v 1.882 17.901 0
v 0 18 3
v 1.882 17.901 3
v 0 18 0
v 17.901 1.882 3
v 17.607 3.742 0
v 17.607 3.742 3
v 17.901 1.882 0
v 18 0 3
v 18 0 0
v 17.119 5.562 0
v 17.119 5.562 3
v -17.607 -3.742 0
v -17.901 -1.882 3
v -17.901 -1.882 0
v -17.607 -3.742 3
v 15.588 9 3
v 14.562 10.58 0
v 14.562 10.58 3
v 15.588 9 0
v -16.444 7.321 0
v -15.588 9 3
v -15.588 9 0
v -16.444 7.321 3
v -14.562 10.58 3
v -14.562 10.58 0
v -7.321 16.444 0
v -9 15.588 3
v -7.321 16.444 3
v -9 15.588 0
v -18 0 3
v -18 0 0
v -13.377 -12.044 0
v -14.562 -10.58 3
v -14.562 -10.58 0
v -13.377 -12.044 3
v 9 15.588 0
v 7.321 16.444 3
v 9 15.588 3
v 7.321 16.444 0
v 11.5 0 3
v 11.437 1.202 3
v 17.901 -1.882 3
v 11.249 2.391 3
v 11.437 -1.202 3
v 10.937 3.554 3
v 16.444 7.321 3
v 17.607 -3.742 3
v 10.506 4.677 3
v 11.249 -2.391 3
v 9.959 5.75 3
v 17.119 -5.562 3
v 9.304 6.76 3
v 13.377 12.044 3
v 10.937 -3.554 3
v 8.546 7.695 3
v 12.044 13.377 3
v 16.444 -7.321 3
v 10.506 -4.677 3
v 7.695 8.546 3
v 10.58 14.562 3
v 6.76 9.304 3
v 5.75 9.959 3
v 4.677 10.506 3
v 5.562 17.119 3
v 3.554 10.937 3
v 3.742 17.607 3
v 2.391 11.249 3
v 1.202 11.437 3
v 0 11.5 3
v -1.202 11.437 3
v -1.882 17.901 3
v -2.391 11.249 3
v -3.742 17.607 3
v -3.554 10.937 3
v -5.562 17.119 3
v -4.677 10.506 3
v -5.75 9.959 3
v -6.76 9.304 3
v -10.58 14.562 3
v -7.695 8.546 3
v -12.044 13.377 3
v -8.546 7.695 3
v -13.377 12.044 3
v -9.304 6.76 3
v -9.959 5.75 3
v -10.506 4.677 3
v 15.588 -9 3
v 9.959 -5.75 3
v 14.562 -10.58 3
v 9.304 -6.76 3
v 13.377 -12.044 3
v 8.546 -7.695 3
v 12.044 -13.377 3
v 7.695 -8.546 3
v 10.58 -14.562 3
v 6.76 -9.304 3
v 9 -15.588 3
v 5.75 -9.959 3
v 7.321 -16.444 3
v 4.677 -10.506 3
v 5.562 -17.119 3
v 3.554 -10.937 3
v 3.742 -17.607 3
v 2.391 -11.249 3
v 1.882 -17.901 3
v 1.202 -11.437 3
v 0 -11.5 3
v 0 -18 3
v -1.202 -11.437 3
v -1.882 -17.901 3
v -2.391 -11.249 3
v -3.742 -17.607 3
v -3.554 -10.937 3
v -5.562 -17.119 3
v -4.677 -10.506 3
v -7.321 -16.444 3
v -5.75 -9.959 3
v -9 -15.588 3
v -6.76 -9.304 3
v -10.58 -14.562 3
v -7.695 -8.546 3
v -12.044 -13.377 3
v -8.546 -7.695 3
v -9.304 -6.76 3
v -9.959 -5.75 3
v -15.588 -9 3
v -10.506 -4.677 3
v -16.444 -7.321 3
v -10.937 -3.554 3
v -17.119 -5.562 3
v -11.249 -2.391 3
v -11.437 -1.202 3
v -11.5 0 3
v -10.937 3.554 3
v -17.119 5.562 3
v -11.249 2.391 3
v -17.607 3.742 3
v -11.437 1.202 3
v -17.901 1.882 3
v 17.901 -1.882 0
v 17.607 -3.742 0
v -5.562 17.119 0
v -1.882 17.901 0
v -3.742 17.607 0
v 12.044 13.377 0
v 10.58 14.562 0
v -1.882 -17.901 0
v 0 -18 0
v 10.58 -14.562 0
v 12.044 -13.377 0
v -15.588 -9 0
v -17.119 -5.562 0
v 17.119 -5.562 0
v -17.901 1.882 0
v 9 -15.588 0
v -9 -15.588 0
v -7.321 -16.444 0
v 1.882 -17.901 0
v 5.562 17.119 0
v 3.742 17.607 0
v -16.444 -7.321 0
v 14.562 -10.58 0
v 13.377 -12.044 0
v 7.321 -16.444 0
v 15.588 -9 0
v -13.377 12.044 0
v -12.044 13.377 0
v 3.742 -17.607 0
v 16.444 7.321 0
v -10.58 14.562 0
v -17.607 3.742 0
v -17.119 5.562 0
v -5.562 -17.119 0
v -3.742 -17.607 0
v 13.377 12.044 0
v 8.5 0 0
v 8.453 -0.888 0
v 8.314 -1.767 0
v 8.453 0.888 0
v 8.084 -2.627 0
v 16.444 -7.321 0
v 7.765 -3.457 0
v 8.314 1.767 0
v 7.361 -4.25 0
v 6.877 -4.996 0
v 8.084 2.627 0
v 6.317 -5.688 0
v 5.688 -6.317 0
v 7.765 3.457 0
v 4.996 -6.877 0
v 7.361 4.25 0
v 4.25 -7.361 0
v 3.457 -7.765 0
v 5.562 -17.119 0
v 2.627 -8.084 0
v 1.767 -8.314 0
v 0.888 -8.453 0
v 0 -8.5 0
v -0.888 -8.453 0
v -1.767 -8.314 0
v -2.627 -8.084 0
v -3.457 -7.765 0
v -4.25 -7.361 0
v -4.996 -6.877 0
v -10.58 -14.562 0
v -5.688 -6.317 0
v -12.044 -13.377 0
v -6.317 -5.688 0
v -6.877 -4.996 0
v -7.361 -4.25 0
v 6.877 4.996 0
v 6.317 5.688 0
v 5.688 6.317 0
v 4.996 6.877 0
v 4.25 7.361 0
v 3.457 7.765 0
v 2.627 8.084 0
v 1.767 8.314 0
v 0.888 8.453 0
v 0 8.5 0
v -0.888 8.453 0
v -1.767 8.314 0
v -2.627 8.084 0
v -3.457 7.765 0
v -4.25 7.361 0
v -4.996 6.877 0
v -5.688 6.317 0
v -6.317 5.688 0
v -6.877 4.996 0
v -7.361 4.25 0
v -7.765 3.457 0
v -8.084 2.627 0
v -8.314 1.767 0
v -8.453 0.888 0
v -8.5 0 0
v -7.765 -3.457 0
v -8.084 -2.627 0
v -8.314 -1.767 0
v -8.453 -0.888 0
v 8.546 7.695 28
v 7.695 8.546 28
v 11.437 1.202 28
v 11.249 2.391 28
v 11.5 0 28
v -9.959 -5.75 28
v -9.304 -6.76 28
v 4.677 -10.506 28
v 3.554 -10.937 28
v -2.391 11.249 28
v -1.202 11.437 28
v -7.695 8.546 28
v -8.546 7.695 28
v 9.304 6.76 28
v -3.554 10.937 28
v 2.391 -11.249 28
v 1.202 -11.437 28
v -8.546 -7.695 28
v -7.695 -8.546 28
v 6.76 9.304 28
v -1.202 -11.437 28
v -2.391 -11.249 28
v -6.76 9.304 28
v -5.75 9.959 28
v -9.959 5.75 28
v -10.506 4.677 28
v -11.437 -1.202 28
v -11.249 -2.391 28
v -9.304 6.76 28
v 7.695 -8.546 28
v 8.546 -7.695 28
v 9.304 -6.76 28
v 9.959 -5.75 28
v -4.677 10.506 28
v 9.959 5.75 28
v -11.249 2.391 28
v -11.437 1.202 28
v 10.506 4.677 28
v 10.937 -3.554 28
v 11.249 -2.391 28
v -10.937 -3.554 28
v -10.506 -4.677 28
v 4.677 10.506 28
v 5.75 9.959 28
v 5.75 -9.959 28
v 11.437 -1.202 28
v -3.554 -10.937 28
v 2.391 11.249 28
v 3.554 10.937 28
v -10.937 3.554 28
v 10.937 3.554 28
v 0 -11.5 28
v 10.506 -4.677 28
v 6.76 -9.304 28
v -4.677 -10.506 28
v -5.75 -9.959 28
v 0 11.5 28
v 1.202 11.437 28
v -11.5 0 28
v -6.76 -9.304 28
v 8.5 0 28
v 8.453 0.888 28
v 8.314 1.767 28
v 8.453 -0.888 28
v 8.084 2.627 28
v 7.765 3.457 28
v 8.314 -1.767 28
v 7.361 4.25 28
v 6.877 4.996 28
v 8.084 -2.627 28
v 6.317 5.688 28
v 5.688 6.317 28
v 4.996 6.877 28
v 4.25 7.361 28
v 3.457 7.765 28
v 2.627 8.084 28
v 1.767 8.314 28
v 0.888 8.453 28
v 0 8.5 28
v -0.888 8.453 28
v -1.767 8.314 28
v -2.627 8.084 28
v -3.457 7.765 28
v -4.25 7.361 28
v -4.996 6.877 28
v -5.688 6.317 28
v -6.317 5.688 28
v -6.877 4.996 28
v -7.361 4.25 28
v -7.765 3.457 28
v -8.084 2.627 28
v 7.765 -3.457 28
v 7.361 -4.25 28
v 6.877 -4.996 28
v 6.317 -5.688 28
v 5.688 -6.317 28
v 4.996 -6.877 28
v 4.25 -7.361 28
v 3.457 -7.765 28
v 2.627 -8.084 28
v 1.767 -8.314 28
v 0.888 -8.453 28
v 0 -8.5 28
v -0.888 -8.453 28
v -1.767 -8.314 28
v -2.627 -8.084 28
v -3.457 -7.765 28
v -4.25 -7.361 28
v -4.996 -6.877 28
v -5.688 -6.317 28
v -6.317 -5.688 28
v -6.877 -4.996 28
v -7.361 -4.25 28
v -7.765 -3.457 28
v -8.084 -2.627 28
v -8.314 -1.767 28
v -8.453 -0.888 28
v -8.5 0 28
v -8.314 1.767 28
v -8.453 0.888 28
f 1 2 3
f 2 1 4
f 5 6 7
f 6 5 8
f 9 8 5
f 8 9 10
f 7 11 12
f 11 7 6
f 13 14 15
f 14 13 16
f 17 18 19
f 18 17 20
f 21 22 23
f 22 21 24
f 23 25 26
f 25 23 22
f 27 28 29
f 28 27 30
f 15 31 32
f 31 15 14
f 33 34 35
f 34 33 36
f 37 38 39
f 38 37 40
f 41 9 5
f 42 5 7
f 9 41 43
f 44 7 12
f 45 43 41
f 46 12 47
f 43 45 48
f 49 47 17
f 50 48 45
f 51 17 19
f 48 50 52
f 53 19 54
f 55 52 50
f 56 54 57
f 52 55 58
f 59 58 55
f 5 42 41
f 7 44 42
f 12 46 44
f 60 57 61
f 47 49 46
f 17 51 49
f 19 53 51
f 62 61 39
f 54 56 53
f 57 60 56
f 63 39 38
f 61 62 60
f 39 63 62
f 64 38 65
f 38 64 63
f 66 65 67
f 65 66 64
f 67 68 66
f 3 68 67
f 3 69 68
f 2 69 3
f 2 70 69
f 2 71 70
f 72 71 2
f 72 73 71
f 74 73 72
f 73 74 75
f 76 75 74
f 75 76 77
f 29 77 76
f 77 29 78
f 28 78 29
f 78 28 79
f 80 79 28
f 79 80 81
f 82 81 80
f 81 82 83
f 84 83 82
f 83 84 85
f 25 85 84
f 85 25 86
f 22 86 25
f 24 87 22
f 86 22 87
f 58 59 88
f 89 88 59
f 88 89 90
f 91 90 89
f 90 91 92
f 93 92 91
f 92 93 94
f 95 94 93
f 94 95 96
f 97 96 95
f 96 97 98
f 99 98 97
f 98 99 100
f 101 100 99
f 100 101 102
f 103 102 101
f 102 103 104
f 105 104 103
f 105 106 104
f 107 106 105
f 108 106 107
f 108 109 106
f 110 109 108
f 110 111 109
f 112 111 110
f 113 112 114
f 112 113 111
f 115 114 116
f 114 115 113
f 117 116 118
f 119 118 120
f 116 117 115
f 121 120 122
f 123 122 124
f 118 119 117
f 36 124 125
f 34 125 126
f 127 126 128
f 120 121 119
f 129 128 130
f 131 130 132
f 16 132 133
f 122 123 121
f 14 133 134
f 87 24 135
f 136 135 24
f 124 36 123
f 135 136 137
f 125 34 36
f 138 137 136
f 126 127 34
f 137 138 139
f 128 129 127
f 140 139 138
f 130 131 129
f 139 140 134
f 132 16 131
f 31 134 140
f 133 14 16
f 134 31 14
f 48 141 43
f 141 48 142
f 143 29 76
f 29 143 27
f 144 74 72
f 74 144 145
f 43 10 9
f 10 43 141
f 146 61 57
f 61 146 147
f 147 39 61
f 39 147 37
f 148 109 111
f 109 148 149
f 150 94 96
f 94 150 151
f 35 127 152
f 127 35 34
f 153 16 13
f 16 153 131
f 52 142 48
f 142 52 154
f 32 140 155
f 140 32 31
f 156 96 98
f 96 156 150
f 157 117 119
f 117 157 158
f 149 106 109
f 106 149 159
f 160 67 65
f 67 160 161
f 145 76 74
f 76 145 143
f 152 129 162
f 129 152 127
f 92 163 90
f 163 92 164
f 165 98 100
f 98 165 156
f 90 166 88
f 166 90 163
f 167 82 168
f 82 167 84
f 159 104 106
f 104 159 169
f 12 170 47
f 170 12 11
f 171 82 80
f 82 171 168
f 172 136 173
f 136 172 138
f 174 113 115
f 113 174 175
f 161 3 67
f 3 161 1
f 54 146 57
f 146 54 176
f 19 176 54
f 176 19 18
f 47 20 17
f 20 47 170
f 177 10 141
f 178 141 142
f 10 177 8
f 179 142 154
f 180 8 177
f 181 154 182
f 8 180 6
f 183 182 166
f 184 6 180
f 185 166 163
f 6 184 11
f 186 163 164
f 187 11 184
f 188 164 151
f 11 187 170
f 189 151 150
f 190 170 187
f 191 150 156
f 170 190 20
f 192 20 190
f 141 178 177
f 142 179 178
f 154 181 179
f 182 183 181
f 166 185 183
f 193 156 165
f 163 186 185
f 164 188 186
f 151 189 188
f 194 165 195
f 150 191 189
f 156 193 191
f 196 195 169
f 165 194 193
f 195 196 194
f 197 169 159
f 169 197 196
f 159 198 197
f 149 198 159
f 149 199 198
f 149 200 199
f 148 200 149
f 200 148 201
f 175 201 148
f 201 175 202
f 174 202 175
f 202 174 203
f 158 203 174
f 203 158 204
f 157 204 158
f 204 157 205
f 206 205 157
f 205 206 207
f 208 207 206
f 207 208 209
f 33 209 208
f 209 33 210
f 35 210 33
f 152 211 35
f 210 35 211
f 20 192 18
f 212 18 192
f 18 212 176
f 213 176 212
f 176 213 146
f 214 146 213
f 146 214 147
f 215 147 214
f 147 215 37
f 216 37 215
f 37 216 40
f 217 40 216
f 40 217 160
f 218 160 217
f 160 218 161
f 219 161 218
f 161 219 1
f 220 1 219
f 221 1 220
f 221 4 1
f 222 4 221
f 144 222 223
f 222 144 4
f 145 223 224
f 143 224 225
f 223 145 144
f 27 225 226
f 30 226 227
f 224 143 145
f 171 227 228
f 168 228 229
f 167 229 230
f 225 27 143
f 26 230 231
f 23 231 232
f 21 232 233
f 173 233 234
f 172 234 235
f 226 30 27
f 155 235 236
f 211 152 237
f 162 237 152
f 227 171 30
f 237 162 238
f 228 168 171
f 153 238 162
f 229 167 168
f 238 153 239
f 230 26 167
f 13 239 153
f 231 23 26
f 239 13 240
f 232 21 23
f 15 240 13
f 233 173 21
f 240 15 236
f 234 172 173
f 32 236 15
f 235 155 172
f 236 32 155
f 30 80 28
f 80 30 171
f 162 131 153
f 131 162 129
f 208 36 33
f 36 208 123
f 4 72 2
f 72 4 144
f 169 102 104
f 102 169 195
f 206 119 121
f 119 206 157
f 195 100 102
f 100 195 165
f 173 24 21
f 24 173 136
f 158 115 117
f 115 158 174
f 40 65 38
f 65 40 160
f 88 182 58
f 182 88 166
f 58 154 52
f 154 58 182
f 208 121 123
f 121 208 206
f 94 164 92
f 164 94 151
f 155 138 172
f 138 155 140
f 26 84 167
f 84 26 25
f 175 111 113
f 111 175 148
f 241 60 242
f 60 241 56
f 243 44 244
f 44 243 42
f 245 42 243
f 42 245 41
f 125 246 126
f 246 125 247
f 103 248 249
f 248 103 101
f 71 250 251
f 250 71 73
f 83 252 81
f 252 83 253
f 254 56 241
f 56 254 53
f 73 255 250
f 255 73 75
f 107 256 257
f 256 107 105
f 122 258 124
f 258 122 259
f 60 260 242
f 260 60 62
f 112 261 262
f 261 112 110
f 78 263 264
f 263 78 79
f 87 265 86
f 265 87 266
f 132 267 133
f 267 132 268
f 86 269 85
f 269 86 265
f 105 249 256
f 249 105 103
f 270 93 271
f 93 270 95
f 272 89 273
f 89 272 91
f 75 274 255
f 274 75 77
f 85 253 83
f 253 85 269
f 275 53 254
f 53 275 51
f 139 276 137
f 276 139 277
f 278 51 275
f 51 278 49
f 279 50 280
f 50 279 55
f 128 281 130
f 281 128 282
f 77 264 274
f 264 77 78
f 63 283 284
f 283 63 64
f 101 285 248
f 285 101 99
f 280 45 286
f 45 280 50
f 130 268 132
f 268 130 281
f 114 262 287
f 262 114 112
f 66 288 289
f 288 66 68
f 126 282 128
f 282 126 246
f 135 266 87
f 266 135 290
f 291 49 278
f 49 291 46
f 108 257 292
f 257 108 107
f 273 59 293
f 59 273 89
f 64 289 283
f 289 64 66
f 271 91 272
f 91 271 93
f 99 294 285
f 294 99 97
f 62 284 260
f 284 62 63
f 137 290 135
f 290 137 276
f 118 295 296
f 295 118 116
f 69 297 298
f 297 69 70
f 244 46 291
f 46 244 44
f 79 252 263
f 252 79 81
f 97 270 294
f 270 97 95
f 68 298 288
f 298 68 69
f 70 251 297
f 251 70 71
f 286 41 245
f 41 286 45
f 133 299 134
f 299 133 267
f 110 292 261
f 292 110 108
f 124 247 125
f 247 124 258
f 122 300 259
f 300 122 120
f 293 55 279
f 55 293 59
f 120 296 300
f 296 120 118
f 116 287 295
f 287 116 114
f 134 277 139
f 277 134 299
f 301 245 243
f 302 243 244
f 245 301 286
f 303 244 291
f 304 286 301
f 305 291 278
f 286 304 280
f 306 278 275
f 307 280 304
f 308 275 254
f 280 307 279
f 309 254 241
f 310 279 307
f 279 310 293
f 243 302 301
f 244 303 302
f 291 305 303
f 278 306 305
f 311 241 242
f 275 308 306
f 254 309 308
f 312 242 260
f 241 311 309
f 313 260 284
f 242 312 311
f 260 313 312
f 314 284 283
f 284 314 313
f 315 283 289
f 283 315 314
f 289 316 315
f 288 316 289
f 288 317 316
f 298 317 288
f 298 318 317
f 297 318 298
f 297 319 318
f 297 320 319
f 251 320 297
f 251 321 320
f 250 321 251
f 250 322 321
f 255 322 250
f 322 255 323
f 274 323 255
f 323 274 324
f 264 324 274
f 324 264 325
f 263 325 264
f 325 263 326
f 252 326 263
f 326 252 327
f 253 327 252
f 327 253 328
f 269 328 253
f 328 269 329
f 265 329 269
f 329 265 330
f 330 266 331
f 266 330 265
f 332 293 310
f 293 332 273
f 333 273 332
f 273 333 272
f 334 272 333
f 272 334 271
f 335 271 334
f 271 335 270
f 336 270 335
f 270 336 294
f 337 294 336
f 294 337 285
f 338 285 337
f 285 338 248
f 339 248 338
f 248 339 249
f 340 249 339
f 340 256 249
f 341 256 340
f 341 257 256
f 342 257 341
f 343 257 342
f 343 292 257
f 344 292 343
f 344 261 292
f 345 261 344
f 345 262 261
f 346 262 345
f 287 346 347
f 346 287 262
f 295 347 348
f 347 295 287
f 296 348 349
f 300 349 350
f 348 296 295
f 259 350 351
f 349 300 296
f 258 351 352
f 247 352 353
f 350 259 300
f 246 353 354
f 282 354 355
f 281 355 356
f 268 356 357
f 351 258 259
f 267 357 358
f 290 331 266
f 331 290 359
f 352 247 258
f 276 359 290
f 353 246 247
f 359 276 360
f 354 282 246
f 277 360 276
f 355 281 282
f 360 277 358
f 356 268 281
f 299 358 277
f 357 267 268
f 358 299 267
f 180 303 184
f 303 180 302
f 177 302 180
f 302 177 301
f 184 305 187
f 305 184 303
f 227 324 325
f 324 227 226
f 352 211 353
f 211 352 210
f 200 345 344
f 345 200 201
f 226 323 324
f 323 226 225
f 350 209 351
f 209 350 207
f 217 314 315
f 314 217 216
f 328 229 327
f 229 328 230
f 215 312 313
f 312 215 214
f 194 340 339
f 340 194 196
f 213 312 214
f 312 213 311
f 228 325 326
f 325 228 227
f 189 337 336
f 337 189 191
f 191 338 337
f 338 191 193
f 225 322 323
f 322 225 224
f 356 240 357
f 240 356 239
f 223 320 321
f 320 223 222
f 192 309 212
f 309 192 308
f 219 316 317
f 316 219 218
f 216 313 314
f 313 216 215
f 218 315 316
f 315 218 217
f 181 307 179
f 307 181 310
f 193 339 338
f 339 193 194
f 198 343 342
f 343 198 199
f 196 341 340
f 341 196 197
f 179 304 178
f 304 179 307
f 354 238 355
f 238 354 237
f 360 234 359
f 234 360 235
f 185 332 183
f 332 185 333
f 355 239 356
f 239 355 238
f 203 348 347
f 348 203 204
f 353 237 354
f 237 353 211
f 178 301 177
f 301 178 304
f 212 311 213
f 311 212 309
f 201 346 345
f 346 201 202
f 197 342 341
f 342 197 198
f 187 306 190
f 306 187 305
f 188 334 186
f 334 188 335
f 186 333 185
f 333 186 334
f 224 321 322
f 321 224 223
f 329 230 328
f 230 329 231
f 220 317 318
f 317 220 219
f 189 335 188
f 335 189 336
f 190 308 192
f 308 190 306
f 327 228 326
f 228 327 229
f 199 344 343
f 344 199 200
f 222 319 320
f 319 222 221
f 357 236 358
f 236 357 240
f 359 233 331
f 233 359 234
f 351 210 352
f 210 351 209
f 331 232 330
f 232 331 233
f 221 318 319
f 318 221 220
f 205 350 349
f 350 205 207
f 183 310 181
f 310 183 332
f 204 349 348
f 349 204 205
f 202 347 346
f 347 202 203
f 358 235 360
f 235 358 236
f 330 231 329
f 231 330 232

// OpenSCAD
// Threaded mounting boss.
$fn = 60;
eps = 0.02;
thread_d = 17;
base_d = 36;
height = 28;
difference() { union() { cylinder(d=base_d,h=3); cylinder(d=thread_d+6,h=height); } translate([0,0,-eps]) cylinder(d=thread_d,h=height+2*eps); }
